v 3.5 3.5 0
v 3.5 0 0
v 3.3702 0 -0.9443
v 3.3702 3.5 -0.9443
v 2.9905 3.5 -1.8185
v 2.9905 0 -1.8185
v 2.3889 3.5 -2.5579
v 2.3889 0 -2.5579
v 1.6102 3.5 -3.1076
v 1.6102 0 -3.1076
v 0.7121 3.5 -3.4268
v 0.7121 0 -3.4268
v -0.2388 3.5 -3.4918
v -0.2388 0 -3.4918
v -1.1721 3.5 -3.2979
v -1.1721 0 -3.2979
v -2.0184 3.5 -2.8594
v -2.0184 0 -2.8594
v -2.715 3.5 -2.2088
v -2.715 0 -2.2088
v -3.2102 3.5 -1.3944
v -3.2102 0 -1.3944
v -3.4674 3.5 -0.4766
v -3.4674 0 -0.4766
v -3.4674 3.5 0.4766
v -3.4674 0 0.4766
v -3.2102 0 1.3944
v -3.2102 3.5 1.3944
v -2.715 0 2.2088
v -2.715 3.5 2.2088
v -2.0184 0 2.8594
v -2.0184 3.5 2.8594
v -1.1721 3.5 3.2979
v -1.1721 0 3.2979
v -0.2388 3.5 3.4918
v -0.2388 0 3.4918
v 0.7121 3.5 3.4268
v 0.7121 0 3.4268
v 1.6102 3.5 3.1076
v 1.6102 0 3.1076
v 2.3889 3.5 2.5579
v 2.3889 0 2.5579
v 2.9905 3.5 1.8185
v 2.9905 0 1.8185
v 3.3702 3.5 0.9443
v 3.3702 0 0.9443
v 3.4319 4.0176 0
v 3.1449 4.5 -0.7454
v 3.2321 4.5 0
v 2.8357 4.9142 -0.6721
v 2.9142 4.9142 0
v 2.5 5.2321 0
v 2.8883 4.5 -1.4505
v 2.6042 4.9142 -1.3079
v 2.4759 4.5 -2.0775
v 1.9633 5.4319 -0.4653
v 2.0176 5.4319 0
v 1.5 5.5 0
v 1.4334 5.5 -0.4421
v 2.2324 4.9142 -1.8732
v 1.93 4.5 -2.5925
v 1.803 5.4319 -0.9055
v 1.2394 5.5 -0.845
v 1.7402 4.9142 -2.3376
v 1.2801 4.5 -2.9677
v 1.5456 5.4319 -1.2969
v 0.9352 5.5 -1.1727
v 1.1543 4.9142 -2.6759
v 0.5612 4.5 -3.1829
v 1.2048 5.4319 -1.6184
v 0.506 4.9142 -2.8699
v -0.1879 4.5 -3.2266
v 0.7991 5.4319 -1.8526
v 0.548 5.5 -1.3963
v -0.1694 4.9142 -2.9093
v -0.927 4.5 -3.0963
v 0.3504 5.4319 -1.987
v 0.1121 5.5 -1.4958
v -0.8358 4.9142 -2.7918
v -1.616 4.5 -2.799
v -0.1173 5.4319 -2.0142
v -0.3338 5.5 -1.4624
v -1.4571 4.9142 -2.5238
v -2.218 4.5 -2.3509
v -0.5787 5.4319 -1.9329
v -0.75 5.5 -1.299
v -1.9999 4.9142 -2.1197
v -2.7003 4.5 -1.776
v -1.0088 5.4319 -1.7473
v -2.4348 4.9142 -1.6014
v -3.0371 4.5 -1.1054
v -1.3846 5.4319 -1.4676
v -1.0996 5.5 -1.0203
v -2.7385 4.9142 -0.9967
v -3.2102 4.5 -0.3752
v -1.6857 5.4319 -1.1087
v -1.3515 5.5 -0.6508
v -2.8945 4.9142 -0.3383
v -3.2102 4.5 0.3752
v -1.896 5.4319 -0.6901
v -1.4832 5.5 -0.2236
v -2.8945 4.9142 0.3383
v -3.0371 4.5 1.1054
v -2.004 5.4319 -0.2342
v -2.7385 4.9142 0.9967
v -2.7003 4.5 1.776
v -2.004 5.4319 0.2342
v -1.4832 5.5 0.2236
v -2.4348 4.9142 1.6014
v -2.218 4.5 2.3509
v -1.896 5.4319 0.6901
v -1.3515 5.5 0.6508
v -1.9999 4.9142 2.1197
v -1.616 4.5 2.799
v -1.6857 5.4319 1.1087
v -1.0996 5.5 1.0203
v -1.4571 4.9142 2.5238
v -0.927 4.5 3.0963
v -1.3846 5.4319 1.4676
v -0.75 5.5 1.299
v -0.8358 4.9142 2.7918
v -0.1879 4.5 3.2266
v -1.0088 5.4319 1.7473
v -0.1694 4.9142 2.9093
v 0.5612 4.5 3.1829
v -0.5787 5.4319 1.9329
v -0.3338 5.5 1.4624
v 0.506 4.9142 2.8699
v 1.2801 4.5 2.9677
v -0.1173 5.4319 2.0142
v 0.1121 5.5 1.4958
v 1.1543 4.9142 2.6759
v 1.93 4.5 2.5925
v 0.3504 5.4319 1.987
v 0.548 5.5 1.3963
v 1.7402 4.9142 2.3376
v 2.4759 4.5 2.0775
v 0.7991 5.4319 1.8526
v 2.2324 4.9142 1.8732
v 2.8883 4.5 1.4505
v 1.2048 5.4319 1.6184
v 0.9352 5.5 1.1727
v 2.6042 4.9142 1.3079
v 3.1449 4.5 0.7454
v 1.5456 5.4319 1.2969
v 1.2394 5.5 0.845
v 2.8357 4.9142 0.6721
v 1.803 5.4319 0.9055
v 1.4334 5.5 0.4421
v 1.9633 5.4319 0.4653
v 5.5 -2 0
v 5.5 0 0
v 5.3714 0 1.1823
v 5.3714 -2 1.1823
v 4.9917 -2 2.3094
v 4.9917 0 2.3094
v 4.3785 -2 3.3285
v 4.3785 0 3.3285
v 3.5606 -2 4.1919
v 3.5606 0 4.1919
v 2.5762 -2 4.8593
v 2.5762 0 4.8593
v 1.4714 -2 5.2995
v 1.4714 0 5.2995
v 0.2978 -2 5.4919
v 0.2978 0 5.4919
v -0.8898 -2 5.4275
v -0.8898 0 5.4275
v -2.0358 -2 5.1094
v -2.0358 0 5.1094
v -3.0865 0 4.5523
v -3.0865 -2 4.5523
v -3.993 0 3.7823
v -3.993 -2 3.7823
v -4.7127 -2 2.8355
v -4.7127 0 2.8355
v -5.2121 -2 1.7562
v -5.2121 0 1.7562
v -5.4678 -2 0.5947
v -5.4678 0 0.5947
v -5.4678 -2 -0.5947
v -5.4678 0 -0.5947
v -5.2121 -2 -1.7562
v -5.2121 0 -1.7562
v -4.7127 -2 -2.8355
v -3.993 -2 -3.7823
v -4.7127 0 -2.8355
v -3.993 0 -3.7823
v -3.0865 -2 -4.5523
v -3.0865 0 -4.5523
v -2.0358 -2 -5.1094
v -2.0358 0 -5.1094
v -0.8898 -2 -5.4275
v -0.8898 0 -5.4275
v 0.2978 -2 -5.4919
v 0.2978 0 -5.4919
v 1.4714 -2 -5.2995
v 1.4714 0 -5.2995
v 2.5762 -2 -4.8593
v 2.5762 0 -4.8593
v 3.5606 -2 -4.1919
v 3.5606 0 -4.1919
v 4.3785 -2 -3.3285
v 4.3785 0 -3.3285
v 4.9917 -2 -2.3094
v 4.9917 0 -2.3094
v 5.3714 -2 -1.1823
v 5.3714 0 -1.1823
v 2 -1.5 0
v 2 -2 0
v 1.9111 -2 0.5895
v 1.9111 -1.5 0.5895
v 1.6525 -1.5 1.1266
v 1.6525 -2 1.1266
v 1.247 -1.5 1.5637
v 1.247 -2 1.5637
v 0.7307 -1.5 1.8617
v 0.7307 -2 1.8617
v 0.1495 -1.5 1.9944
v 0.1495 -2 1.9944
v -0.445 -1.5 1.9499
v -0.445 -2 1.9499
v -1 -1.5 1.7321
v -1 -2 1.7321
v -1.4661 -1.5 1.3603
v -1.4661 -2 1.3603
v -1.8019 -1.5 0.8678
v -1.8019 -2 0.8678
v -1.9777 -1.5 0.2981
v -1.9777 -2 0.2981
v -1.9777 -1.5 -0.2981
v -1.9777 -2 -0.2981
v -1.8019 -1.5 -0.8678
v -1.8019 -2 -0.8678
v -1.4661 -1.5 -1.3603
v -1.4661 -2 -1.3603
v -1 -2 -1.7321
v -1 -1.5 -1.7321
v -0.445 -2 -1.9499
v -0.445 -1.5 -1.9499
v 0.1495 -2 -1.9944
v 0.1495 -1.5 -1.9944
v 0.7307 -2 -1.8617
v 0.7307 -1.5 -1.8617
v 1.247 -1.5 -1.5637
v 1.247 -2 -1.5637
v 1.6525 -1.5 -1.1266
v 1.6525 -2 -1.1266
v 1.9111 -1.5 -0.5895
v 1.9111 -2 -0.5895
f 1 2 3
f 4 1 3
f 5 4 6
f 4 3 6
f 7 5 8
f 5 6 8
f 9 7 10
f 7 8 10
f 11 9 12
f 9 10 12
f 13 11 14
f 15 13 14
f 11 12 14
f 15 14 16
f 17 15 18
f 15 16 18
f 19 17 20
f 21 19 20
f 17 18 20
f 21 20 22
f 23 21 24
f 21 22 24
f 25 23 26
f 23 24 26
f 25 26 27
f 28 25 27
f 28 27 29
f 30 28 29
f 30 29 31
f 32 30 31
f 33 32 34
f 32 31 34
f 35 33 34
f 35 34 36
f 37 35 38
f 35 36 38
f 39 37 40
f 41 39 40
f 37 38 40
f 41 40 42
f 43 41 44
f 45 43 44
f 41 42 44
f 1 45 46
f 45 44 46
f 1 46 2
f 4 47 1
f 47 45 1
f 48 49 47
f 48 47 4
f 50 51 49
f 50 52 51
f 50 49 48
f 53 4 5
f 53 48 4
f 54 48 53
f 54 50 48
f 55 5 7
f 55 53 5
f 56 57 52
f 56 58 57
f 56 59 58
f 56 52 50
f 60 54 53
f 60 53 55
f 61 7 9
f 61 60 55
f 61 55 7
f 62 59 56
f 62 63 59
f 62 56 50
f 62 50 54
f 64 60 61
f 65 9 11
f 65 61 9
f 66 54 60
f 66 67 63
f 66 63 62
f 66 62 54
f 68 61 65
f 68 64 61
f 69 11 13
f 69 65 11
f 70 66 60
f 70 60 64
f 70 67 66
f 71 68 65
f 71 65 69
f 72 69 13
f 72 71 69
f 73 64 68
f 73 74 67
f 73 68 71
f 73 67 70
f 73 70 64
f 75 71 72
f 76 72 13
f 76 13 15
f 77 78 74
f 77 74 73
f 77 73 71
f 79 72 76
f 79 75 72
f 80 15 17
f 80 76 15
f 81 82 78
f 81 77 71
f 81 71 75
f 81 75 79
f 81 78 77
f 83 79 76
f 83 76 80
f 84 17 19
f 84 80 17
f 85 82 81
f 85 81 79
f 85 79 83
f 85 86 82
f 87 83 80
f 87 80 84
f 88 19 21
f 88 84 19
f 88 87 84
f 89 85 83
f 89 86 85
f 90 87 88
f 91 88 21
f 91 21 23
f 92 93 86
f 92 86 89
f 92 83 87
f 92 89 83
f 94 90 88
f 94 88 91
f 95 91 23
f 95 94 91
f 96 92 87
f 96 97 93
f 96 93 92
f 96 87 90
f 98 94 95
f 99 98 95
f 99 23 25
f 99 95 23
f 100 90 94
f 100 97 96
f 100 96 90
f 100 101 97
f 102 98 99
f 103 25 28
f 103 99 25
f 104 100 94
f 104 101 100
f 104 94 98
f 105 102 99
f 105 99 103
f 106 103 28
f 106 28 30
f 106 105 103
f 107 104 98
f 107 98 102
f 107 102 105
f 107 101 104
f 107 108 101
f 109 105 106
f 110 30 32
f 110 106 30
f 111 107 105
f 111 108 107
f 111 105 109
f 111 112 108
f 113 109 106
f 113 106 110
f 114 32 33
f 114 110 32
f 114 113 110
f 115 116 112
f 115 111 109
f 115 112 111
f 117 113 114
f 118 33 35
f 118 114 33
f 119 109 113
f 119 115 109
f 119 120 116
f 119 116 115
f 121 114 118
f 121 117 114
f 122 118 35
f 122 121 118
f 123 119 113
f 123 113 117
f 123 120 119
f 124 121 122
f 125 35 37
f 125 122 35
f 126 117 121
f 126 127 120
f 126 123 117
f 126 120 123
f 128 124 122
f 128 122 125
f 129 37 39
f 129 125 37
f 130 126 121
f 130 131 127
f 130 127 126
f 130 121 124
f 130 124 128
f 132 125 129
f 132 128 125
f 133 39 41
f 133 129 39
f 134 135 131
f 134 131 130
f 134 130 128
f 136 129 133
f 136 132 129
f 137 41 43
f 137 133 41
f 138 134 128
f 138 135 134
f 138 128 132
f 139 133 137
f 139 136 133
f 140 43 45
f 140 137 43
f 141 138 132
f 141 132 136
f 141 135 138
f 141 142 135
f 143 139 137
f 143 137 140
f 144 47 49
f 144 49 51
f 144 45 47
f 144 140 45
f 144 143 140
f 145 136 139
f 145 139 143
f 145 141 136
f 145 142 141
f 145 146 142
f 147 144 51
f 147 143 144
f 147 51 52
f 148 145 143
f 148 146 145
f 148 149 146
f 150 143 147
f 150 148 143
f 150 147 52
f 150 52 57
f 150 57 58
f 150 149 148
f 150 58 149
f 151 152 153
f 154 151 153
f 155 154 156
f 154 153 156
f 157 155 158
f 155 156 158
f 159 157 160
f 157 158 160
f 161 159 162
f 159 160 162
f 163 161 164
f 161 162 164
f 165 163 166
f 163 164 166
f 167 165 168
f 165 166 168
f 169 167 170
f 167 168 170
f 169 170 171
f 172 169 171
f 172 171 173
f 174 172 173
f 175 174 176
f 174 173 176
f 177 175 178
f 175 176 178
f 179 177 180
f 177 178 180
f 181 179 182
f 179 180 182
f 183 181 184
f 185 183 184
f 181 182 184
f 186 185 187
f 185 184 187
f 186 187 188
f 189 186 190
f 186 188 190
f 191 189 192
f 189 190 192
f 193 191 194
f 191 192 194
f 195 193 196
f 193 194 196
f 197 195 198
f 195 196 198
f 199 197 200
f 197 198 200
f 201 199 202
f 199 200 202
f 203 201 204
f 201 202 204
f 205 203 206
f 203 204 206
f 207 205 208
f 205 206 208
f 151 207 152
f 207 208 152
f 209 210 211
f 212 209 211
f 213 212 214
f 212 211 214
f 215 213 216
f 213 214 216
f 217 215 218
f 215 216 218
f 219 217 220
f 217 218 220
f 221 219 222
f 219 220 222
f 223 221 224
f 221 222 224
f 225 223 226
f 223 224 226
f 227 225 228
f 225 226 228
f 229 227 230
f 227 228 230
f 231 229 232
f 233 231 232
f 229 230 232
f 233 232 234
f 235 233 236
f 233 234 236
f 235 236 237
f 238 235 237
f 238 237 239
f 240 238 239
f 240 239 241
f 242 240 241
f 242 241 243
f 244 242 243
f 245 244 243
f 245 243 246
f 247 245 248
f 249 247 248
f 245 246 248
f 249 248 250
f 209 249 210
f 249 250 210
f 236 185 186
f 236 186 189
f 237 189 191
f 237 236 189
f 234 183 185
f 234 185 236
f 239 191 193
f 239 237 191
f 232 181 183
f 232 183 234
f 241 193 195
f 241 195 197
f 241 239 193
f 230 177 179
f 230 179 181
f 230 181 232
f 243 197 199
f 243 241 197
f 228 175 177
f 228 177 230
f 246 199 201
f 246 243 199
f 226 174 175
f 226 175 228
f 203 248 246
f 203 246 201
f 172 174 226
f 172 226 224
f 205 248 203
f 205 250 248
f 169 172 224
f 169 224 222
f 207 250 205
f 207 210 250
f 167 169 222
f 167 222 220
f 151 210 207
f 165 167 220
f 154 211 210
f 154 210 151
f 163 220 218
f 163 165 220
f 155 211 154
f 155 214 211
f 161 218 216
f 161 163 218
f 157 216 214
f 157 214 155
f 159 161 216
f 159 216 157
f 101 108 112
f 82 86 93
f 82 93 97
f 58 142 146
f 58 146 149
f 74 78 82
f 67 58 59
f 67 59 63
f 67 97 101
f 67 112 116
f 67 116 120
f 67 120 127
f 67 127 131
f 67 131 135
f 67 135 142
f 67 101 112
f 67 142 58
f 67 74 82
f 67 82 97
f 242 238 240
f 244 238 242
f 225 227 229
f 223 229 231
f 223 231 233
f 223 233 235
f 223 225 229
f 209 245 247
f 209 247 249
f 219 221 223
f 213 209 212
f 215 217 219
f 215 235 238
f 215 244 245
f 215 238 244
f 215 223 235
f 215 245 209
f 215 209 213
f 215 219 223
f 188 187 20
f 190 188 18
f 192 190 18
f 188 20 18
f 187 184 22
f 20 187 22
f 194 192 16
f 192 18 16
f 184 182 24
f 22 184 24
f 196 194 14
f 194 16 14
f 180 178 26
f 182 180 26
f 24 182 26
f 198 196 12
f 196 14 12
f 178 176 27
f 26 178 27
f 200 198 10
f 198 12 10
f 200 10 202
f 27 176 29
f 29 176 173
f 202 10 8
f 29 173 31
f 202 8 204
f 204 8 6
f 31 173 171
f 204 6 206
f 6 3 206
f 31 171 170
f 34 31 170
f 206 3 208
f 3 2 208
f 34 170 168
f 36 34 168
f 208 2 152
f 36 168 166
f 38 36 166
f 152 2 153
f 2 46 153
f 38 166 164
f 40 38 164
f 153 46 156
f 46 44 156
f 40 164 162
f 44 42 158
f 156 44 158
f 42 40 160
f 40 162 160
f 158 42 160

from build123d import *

# Parameters (mm, degrees)
SKIZZE1_R                       = 3.5
AUFSATZ_LINEAR_AUSTRAGEN1_DEPTH = 5.5
SKIZZE2_R                       = 5.5
AUFSATZ_LINEAR_AUSTRAGEN2_DEPTH = 2
SKIZZE3_R                       = 2
SCHNITT_LINEAR_AUSTRAGEN1_DEPTH = 0.5
VERRUNDUNG1_R                   = 2


with BuildPart() as part:
    # Skizze1 → Aufsatz-Linear austragen1 (new body)
    with BuildSketch(Plane(origin=(0, 0, 0), x_dir=(1, 0, 0), z_dir=(0, 1, 0))):
        Circle(SKIZZE1_R)
    extrude(amount=AUFSATZ_LINEAR_AUSTRAGEN1_DEPTH)

    # Skizze2 → Aufsatz-Linear austragen2 (add)
    with BuildSketch(Plane.XZ):
        Circle(SKIZZE2_R)
    extrude(amount=AUFSATZ_LINEAR_AUSTRAGEN2_DEPTH)

    # Skizze3 → Schnitt-Linear austragen1 (cut)
    with BuildSketch(Plane.XZ.offset(2)):
        Circle(SKIZZE3_R)
    extrude(amount=-SCHNITT_LINEAR_AUSTRAGEN1_DEPTH, mode=Mode.SUBTRACT)

    # Verrundung1
    verrundung1_edges = [part.edges().sort_by_distance(p)[0] for p in [
        (-3.5, 5.5, 0),
    ]]
    fillet(verrundung1_edges, radius=VERRUNDUNG1_R)


solid = part.part
